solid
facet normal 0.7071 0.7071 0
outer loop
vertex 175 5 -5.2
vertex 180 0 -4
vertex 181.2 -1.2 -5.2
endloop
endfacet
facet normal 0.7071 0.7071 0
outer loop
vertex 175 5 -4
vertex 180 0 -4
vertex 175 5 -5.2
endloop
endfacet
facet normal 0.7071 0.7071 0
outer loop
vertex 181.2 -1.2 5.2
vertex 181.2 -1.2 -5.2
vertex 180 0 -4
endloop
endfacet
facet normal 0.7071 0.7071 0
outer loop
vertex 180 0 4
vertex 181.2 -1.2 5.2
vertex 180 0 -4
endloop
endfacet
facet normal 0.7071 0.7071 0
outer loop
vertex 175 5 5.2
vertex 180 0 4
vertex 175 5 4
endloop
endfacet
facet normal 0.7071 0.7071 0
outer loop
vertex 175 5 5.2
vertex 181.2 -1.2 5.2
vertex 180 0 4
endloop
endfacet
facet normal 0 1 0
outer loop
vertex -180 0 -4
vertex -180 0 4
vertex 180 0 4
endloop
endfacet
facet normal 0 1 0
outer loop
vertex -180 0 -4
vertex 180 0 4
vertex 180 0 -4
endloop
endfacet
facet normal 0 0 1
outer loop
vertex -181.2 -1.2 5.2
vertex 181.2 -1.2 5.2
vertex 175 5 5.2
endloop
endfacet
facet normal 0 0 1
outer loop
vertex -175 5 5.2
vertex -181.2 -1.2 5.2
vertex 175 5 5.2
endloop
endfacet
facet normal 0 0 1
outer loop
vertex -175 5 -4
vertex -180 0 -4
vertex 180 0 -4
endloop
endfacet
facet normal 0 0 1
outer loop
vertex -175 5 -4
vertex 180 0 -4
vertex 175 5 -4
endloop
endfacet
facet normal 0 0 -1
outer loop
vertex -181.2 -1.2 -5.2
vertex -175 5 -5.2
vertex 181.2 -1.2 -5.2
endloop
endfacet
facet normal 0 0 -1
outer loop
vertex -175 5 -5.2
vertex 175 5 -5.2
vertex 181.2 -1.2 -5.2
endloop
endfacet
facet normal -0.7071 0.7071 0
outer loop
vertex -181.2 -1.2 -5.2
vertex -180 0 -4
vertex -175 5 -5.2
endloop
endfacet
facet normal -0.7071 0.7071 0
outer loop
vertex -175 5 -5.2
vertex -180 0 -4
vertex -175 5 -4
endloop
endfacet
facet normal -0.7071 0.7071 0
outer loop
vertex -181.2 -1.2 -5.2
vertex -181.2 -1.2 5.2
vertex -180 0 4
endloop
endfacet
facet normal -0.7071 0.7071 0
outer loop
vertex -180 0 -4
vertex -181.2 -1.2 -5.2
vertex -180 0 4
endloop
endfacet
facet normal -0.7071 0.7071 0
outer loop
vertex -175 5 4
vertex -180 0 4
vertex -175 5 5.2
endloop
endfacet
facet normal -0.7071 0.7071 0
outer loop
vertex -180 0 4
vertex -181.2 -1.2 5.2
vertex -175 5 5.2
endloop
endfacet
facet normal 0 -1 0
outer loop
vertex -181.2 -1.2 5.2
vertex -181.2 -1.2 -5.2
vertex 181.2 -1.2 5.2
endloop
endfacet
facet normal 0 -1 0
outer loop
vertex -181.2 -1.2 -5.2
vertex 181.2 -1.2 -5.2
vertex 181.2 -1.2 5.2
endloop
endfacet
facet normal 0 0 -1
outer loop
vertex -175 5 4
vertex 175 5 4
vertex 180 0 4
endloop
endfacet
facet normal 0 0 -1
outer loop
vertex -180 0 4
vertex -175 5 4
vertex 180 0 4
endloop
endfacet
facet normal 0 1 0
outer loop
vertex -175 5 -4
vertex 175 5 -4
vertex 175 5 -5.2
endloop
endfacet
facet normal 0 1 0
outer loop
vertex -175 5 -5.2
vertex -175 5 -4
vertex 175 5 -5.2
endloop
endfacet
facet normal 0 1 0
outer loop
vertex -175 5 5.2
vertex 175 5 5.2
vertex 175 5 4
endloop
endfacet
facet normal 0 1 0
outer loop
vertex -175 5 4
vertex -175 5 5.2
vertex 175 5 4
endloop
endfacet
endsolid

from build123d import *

# Parameters (mm, degrees)
BOSS_EXTRUDE1_DEPTH = 181.2
CUT_EXTRUDE1_DEPTH  = 11.4


with BuildPart() as part:
    # Sketch1 → Boss-Extrude1 (new body, symmetric)
    with BuildSketch(Plane(origin=(0, 0, 0), x_dir=(0, 0, -1), z_dir=(1, 0, 0))):
        Polygon((-4, 5), (-4, 0), (4, 0), (4, 5), (5.2, 5), (5.2, -1.2), (-5.2, -1.2), (-5.2, 5), align=None)
    extrude(amount=BOSS_EXTRUDE1_DEPTH, both=True)

    # Sketch3 → Cut-Extrude1 (cut, through all)
    with BuildSketch(Plane.XY.offset(5.2)):
        Polygon((-181.2, 5), (-181.2, -1.2), (-175, 5), align=None)
        Polygon((181.2, 5), (181.2, -1.2), (175, 5), align=None)
    extrude(amount=-CUT_EXTRUDE1_DEPTH, mode=Mode.SUBTRACT)


solid = part.part
